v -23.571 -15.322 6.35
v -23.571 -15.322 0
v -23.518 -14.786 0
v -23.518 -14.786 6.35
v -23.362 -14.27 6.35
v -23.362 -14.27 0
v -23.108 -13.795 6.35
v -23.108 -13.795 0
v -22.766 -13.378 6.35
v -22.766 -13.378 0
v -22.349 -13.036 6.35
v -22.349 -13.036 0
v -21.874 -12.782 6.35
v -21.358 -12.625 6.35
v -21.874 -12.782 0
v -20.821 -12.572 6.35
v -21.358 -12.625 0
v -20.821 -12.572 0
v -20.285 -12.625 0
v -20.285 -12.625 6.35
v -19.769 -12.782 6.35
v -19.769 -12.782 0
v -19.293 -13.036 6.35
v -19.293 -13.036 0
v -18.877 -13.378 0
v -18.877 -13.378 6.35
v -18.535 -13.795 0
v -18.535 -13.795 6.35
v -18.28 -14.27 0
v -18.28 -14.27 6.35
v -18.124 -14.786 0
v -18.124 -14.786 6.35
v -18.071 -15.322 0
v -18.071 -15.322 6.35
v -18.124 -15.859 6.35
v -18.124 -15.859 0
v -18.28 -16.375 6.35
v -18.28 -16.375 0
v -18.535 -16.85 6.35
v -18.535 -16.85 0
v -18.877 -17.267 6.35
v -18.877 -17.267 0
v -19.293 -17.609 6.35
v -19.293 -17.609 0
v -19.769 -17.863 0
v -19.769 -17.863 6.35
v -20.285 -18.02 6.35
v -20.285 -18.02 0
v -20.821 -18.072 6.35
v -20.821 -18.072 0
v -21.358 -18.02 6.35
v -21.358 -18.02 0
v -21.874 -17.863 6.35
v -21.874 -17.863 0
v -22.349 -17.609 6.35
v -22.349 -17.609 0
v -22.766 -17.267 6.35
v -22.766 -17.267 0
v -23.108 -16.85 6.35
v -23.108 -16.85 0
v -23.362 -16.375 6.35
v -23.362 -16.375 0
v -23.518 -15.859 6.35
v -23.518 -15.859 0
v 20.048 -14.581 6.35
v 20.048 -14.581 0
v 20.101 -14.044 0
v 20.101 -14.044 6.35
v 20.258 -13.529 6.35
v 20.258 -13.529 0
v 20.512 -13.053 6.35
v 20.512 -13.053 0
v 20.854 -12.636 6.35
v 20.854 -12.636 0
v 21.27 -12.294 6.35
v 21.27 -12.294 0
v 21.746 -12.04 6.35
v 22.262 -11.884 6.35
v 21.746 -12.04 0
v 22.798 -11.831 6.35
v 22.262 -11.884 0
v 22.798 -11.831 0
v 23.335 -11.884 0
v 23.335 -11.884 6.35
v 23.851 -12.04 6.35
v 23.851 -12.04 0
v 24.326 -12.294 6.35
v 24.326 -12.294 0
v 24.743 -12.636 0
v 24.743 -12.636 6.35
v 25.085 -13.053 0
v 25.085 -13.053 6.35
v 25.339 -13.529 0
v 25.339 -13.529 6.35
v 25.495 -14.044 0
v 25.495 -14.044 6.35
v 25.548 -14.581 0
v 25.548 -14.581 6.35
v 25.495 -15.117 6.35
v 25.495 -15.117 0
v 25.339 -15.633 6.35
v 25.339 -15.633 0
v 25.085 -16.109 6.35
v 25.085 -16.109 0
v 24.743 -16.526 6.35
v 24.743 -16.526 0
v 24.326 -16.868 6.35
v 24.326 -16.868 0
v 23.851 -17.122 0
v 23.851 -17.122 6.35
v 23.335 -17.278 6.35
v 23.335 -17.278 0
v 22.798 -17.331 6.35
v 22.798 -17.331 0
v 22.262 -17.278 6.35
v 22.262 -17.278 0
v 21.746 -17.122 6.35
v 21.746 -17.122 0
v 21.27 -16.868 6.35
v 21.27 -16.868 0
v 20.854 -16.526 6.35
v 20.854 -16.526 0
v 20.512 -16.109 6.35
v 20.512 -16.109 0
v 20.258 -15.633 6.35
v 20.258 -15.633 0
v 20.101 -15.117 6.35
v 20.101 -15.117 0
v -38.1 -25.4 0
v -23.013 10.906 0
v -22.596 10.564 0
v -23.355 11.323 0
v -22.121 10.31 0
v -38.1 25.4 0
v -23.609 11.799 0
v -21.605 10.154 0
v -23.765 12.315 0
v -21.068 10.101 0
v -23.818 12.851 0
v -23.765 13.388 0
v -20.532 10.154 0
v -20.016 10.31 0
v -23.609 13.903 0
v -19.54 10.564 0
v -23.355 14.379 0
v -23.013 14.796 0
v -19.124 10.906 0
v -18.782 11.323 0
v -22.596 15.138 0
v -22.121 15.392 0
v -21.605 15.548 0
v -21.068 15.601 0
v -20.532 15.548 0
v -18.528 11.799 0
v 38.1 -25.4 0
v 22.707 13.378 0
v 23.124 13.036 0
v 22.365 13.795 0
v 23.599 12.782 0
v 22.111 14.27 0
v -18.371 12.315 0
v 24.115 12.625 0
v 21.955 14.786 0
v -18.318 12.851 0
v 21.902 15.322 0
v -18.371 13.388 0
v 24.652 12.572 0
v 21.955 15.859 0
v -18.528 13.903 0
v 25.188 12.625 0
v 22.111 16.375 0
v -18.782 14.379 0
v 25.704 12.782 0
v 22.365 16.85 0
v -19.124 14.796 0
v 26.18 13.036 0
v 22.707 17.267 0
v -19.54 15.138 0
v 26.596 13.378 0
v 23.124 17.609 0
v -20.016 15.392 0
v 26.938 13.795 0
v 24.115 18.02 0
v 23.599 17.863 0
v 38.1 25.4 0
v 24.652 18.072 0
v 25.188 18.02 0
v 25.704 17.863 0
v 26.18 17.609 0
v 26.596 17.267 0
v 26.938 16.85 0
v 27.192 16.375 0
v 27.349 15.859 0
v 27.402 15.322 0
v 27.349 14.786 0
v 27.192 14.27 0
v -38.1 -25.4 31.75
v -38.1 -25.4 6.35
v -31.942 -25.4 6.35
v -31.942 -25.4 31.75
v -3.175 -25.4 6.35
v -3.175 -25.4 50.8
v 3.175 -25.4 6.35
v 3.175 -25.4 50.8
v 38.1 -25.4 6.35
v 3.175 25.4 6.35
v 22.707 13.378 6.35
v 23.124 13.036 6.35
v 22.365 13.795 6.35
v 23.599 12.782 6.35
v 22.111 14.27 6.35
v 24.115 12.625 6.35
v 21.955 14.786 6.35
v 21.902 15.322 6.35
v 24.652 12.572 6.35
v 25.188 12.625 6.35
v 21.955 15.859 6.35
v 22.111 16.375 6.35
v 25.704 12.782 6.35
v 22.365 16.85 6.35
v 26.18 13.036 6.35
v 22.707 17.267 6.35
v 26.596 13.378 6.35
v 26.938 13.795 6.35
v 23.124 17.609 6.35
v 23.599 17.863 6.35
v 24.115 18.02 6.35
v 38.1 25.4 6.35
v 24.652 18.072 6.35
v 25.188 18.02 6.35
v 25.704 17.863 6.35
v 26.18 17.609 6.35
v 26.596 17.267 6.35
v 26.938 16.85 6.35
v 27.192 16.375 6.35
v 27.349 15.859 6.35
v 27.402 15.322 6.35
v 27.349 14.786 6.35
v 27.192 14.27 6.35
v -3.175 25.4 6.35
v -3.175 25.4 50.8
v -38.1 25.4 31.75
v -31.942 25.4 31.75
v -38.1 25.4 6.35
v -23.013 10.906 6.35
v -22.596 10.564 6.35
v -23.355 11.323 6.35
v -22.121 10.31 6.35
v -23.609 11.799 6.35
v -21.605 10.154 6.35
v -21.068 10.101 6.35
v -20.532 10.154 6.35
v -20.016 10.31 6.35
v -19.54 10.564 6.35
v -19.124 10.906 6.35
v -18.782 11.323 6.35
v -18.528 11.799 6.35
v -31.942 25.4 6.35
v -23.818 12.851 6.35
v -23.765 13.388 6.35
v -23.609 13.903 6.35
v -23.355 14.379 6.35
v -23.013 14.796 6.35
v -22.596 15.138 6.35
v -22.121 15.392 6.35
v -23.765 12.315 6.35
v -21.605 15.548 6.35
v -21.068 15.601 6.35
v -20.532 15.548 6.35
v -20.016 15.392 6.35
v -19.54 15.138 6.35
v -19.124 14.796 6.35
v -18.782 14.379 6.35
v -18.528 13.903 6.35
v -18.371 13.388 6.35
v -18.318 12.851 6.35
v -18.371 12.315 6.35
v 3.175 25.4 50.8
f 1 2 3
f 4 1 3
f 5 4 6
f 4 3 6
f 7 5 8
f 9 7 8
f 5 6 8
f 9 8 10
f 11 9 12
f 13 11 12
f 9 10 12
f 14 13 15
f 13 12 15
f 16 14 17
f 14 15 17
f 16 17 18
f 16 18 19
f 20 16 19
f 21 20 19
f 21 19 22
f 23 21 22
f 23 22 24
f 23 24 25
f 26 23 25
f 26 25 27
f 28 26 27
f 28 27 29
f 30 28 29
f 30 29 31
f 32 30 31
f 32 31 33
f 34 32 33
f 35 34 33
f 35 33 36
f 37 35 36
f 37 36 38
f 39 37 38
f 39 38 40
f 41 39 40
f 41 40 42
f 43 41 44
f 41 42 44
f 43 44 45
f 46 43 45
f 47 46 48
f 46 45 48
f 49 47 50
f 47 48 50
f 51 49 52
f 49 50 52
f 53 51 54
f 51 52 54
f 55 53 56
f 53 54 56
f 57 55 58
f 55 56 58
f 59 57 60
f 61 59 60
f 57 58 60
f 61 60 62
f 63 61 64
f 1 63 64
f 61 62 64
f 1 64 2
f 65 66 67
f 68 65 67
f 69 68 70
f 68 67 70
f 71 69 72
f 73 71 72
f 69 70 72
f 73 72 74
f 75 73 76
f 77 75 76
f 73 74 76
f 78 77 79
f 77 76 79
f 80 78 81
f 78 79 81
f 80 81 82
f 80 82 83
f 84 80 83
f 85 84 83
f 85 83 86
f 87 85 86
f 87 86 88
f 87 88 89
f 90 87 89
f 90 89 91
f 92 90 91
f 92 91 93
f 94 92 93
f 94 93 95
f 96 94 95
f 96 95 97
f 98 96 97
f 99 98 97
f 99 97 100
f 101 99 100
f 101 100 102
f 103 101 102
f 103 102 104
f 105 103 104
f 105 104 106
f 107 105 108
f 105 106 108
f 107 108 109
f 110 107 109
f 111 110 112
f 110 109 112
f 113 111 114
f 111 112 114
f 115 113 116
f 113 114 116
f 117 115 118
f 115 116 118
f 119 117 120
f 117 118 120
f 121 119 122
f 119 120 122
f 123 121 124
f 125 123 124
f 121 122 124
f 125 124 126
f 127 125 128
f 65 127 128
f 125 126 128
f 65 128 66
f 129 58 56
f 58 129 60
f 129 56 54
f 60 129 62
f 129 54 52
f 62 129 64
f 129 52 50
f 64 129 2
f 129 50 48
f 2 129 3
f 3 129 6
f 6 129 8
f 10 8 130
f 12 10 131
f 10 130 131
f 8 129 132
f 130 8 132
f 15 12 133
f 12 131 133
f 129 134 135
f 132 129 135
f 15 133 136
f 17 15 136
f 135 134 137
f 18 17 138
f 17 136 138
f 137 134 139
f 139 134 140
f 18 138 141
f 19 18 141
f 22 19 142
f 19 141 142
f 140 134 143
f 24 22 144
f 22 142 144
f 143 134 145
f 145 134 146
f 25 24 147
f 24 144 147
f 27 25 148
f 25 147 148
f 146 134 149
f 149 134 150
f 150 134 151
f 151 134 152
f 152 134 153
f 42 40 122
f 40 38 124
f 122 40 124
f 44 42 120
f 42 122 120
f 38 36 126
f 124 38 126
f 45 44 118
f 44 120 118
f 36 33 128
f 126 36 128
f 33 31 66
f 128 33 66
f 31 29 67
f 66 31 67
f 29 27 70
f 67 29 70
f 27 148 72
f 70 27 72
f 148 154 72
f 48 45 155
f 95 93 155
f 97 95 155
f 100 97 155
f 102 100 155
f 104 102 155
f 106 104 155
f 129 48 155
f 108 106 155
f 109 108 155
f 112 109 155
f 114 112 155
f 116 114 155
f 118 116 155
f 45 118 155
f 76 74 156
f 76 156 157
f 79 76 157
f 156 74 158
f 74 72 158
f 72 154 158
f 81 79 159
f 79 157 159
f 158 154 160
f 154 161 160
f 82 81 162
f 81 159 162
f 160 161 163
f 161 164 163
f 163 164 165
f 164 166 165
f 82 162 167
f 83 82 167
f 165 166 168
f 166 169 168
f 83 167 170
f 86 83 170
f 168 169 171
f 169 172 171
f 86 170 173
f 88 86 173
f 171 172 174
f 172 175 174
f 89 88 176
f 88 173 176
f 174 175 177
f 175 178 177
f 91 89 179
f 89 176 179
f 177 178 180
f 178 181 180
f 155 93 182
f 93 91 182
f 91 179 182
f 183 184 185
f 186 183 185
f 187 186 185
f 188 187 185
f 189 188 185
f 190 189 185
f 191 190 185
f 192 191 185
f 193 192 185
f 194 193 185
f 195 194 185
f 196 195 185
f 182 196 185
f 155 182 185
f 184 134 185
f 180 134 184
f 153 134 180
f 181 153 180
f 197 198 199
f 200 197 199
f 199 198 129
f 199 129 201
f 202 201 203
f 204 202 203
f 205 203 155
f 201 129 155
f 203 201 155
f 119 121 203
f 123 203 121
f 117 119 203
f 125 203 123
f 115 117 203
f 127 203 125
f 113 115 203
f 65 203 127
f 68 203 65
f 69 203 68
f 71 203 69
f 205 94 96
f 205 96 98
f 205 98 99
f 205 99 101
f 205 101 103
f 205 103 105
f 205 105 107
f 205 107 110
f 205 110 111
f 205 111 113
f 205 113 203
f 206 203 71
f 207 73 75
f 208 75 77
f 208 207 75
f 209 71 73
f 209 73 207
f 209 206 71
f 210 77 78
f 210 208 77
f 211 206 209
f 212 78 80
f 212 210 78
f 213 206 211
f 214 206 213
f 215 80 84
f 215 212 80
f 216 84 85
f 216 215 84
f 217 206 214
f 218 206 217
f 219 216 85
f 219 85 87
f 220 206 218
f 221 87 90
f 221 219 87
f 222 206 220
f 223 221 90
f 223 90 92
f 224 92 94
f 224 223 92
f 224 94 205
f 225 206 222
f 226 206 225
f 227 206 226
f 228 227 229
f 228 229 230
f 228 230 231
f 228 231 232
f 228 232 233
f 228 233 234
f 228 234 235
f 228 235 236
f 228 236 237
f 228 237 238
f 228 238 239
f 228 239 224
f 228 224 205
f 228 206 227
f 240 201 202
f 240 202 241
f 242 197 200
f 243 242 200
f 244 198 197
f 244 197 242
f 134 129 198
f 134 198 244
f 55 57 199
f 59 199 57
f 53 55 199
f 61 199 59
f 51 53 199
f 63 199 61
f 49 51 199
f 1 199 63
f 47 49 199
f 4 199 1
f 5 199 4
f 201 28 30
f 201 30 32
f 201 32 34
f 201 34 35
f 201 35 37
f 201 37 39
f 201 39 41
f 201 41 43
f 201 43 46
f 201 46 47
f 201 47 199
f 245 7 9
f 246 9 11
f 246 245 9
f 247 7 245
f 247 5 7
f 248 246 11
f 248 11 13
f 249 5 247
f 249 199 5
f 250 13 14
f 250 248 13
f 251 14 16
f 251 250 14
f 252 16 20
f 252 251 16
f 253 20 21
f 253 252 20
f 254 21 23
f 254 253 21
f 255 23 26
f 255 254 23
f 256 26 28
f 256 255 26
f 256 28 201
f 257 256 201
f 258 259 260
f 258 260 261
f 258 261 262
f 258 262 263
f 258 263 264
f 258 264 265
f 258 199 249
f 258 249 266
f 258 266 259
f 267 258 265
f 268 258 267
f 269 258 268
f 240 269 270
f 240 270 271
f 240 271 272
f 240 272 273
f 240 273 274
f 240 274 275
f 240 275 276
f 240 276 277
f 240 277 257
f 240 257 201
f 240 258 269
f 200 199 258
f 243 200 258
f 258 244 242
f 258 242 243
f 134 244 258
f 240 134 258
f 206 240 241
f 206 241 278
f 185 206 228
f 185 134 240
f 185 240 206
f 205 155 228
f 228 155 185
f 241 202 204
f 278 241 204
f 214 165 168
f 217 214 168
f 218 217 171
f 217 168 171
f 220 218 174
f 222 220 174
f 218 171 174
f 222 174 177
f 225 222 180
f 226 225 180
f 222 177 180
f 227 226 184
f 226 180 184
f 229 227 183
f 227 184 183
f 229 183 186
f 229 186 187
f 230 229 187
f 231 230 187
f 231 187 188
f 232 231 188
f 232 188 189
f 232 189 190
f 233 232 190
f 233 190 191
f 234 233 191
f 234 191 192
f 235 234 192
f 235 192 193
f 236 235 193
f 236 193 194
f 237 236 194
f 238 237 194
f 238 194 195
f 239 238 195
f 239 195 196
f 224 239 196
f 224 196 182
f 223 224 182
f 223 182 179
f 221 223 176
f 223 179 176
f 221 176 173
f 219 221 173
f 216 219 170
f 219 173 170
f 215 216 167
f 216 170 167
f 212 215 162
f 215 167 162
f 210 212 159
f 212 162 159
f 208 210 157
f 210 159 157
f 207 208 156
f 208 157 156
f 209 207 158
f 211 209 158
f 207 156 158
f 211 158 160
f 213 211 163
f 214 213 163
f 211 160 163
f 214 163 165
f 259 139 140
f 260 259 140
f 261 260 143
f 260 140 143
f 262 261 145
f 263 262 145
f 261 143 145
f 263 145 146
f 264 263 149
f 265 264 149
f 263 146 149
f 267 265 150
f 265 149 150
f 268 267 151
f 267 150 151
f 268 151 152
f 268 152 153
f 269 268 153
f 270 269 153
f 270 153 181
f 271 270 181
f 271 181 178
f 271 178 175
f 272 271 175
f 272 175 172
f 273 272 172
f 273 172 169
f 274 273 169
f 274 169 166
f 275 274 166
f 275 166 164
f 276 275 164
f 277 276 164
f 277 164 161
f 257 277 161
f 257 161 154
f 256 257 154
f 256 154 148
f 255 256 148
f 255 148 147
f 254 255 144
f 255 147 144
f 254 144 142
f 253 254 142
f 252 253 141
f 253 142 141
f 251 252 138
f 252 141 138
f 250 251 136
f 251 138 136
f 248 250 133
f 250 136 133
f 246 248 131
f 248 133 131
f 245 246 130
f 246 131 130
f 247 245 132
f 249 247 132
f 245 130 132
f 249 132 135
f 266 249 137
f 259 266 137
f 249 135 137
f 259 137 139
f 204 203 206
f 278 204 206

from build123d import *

# Parameters (mm, degrees)
F0_W     = 76.2
F0_H     = 50.8
F1_DEPTH = 6.35
F2_W     = 6.35
F2_H     = 50.8
F3_DEPTH = 50.8
F5_D     = 5.5
F6_W     = 6.1577814579
F6_H     = 50.8
F7_DEPTH = 25.4


with BuildPart() as f1:
    # F0 (on Top) → F1 (new body)
    with BuildSketch(Plane.XY):
        Rectangle(F0_W, F0_H)
    extrude(amount=F1_DEPTH)

    # F2 (on Top) → F3 (join)
    with BuildSketch(Plane.XY):
        Rectangle(F2_W, F2_H)
    extrude(amount=F3_DEPTH)

    # F5 (through all)
    with Locations(Plane.XY.offset(6.35)):
        with Locations((-21.0682712495, 12.8510268405), (-20.8211354911, -15.3223779052), (22.798217833, -14.5809724927), (24.6517322958, 15.3223788366)):
            Hole(F5_D / 2)

    # F6 (on face) → F7 (join)
    with BuildSketch(Plane.XY.offset(6.35)):
        with Locations((-35.021109271, 0)):
            Rectangle(F6_W, F6_H)
    extrude(amount=F7_DEPTH)


solid = f1.part
